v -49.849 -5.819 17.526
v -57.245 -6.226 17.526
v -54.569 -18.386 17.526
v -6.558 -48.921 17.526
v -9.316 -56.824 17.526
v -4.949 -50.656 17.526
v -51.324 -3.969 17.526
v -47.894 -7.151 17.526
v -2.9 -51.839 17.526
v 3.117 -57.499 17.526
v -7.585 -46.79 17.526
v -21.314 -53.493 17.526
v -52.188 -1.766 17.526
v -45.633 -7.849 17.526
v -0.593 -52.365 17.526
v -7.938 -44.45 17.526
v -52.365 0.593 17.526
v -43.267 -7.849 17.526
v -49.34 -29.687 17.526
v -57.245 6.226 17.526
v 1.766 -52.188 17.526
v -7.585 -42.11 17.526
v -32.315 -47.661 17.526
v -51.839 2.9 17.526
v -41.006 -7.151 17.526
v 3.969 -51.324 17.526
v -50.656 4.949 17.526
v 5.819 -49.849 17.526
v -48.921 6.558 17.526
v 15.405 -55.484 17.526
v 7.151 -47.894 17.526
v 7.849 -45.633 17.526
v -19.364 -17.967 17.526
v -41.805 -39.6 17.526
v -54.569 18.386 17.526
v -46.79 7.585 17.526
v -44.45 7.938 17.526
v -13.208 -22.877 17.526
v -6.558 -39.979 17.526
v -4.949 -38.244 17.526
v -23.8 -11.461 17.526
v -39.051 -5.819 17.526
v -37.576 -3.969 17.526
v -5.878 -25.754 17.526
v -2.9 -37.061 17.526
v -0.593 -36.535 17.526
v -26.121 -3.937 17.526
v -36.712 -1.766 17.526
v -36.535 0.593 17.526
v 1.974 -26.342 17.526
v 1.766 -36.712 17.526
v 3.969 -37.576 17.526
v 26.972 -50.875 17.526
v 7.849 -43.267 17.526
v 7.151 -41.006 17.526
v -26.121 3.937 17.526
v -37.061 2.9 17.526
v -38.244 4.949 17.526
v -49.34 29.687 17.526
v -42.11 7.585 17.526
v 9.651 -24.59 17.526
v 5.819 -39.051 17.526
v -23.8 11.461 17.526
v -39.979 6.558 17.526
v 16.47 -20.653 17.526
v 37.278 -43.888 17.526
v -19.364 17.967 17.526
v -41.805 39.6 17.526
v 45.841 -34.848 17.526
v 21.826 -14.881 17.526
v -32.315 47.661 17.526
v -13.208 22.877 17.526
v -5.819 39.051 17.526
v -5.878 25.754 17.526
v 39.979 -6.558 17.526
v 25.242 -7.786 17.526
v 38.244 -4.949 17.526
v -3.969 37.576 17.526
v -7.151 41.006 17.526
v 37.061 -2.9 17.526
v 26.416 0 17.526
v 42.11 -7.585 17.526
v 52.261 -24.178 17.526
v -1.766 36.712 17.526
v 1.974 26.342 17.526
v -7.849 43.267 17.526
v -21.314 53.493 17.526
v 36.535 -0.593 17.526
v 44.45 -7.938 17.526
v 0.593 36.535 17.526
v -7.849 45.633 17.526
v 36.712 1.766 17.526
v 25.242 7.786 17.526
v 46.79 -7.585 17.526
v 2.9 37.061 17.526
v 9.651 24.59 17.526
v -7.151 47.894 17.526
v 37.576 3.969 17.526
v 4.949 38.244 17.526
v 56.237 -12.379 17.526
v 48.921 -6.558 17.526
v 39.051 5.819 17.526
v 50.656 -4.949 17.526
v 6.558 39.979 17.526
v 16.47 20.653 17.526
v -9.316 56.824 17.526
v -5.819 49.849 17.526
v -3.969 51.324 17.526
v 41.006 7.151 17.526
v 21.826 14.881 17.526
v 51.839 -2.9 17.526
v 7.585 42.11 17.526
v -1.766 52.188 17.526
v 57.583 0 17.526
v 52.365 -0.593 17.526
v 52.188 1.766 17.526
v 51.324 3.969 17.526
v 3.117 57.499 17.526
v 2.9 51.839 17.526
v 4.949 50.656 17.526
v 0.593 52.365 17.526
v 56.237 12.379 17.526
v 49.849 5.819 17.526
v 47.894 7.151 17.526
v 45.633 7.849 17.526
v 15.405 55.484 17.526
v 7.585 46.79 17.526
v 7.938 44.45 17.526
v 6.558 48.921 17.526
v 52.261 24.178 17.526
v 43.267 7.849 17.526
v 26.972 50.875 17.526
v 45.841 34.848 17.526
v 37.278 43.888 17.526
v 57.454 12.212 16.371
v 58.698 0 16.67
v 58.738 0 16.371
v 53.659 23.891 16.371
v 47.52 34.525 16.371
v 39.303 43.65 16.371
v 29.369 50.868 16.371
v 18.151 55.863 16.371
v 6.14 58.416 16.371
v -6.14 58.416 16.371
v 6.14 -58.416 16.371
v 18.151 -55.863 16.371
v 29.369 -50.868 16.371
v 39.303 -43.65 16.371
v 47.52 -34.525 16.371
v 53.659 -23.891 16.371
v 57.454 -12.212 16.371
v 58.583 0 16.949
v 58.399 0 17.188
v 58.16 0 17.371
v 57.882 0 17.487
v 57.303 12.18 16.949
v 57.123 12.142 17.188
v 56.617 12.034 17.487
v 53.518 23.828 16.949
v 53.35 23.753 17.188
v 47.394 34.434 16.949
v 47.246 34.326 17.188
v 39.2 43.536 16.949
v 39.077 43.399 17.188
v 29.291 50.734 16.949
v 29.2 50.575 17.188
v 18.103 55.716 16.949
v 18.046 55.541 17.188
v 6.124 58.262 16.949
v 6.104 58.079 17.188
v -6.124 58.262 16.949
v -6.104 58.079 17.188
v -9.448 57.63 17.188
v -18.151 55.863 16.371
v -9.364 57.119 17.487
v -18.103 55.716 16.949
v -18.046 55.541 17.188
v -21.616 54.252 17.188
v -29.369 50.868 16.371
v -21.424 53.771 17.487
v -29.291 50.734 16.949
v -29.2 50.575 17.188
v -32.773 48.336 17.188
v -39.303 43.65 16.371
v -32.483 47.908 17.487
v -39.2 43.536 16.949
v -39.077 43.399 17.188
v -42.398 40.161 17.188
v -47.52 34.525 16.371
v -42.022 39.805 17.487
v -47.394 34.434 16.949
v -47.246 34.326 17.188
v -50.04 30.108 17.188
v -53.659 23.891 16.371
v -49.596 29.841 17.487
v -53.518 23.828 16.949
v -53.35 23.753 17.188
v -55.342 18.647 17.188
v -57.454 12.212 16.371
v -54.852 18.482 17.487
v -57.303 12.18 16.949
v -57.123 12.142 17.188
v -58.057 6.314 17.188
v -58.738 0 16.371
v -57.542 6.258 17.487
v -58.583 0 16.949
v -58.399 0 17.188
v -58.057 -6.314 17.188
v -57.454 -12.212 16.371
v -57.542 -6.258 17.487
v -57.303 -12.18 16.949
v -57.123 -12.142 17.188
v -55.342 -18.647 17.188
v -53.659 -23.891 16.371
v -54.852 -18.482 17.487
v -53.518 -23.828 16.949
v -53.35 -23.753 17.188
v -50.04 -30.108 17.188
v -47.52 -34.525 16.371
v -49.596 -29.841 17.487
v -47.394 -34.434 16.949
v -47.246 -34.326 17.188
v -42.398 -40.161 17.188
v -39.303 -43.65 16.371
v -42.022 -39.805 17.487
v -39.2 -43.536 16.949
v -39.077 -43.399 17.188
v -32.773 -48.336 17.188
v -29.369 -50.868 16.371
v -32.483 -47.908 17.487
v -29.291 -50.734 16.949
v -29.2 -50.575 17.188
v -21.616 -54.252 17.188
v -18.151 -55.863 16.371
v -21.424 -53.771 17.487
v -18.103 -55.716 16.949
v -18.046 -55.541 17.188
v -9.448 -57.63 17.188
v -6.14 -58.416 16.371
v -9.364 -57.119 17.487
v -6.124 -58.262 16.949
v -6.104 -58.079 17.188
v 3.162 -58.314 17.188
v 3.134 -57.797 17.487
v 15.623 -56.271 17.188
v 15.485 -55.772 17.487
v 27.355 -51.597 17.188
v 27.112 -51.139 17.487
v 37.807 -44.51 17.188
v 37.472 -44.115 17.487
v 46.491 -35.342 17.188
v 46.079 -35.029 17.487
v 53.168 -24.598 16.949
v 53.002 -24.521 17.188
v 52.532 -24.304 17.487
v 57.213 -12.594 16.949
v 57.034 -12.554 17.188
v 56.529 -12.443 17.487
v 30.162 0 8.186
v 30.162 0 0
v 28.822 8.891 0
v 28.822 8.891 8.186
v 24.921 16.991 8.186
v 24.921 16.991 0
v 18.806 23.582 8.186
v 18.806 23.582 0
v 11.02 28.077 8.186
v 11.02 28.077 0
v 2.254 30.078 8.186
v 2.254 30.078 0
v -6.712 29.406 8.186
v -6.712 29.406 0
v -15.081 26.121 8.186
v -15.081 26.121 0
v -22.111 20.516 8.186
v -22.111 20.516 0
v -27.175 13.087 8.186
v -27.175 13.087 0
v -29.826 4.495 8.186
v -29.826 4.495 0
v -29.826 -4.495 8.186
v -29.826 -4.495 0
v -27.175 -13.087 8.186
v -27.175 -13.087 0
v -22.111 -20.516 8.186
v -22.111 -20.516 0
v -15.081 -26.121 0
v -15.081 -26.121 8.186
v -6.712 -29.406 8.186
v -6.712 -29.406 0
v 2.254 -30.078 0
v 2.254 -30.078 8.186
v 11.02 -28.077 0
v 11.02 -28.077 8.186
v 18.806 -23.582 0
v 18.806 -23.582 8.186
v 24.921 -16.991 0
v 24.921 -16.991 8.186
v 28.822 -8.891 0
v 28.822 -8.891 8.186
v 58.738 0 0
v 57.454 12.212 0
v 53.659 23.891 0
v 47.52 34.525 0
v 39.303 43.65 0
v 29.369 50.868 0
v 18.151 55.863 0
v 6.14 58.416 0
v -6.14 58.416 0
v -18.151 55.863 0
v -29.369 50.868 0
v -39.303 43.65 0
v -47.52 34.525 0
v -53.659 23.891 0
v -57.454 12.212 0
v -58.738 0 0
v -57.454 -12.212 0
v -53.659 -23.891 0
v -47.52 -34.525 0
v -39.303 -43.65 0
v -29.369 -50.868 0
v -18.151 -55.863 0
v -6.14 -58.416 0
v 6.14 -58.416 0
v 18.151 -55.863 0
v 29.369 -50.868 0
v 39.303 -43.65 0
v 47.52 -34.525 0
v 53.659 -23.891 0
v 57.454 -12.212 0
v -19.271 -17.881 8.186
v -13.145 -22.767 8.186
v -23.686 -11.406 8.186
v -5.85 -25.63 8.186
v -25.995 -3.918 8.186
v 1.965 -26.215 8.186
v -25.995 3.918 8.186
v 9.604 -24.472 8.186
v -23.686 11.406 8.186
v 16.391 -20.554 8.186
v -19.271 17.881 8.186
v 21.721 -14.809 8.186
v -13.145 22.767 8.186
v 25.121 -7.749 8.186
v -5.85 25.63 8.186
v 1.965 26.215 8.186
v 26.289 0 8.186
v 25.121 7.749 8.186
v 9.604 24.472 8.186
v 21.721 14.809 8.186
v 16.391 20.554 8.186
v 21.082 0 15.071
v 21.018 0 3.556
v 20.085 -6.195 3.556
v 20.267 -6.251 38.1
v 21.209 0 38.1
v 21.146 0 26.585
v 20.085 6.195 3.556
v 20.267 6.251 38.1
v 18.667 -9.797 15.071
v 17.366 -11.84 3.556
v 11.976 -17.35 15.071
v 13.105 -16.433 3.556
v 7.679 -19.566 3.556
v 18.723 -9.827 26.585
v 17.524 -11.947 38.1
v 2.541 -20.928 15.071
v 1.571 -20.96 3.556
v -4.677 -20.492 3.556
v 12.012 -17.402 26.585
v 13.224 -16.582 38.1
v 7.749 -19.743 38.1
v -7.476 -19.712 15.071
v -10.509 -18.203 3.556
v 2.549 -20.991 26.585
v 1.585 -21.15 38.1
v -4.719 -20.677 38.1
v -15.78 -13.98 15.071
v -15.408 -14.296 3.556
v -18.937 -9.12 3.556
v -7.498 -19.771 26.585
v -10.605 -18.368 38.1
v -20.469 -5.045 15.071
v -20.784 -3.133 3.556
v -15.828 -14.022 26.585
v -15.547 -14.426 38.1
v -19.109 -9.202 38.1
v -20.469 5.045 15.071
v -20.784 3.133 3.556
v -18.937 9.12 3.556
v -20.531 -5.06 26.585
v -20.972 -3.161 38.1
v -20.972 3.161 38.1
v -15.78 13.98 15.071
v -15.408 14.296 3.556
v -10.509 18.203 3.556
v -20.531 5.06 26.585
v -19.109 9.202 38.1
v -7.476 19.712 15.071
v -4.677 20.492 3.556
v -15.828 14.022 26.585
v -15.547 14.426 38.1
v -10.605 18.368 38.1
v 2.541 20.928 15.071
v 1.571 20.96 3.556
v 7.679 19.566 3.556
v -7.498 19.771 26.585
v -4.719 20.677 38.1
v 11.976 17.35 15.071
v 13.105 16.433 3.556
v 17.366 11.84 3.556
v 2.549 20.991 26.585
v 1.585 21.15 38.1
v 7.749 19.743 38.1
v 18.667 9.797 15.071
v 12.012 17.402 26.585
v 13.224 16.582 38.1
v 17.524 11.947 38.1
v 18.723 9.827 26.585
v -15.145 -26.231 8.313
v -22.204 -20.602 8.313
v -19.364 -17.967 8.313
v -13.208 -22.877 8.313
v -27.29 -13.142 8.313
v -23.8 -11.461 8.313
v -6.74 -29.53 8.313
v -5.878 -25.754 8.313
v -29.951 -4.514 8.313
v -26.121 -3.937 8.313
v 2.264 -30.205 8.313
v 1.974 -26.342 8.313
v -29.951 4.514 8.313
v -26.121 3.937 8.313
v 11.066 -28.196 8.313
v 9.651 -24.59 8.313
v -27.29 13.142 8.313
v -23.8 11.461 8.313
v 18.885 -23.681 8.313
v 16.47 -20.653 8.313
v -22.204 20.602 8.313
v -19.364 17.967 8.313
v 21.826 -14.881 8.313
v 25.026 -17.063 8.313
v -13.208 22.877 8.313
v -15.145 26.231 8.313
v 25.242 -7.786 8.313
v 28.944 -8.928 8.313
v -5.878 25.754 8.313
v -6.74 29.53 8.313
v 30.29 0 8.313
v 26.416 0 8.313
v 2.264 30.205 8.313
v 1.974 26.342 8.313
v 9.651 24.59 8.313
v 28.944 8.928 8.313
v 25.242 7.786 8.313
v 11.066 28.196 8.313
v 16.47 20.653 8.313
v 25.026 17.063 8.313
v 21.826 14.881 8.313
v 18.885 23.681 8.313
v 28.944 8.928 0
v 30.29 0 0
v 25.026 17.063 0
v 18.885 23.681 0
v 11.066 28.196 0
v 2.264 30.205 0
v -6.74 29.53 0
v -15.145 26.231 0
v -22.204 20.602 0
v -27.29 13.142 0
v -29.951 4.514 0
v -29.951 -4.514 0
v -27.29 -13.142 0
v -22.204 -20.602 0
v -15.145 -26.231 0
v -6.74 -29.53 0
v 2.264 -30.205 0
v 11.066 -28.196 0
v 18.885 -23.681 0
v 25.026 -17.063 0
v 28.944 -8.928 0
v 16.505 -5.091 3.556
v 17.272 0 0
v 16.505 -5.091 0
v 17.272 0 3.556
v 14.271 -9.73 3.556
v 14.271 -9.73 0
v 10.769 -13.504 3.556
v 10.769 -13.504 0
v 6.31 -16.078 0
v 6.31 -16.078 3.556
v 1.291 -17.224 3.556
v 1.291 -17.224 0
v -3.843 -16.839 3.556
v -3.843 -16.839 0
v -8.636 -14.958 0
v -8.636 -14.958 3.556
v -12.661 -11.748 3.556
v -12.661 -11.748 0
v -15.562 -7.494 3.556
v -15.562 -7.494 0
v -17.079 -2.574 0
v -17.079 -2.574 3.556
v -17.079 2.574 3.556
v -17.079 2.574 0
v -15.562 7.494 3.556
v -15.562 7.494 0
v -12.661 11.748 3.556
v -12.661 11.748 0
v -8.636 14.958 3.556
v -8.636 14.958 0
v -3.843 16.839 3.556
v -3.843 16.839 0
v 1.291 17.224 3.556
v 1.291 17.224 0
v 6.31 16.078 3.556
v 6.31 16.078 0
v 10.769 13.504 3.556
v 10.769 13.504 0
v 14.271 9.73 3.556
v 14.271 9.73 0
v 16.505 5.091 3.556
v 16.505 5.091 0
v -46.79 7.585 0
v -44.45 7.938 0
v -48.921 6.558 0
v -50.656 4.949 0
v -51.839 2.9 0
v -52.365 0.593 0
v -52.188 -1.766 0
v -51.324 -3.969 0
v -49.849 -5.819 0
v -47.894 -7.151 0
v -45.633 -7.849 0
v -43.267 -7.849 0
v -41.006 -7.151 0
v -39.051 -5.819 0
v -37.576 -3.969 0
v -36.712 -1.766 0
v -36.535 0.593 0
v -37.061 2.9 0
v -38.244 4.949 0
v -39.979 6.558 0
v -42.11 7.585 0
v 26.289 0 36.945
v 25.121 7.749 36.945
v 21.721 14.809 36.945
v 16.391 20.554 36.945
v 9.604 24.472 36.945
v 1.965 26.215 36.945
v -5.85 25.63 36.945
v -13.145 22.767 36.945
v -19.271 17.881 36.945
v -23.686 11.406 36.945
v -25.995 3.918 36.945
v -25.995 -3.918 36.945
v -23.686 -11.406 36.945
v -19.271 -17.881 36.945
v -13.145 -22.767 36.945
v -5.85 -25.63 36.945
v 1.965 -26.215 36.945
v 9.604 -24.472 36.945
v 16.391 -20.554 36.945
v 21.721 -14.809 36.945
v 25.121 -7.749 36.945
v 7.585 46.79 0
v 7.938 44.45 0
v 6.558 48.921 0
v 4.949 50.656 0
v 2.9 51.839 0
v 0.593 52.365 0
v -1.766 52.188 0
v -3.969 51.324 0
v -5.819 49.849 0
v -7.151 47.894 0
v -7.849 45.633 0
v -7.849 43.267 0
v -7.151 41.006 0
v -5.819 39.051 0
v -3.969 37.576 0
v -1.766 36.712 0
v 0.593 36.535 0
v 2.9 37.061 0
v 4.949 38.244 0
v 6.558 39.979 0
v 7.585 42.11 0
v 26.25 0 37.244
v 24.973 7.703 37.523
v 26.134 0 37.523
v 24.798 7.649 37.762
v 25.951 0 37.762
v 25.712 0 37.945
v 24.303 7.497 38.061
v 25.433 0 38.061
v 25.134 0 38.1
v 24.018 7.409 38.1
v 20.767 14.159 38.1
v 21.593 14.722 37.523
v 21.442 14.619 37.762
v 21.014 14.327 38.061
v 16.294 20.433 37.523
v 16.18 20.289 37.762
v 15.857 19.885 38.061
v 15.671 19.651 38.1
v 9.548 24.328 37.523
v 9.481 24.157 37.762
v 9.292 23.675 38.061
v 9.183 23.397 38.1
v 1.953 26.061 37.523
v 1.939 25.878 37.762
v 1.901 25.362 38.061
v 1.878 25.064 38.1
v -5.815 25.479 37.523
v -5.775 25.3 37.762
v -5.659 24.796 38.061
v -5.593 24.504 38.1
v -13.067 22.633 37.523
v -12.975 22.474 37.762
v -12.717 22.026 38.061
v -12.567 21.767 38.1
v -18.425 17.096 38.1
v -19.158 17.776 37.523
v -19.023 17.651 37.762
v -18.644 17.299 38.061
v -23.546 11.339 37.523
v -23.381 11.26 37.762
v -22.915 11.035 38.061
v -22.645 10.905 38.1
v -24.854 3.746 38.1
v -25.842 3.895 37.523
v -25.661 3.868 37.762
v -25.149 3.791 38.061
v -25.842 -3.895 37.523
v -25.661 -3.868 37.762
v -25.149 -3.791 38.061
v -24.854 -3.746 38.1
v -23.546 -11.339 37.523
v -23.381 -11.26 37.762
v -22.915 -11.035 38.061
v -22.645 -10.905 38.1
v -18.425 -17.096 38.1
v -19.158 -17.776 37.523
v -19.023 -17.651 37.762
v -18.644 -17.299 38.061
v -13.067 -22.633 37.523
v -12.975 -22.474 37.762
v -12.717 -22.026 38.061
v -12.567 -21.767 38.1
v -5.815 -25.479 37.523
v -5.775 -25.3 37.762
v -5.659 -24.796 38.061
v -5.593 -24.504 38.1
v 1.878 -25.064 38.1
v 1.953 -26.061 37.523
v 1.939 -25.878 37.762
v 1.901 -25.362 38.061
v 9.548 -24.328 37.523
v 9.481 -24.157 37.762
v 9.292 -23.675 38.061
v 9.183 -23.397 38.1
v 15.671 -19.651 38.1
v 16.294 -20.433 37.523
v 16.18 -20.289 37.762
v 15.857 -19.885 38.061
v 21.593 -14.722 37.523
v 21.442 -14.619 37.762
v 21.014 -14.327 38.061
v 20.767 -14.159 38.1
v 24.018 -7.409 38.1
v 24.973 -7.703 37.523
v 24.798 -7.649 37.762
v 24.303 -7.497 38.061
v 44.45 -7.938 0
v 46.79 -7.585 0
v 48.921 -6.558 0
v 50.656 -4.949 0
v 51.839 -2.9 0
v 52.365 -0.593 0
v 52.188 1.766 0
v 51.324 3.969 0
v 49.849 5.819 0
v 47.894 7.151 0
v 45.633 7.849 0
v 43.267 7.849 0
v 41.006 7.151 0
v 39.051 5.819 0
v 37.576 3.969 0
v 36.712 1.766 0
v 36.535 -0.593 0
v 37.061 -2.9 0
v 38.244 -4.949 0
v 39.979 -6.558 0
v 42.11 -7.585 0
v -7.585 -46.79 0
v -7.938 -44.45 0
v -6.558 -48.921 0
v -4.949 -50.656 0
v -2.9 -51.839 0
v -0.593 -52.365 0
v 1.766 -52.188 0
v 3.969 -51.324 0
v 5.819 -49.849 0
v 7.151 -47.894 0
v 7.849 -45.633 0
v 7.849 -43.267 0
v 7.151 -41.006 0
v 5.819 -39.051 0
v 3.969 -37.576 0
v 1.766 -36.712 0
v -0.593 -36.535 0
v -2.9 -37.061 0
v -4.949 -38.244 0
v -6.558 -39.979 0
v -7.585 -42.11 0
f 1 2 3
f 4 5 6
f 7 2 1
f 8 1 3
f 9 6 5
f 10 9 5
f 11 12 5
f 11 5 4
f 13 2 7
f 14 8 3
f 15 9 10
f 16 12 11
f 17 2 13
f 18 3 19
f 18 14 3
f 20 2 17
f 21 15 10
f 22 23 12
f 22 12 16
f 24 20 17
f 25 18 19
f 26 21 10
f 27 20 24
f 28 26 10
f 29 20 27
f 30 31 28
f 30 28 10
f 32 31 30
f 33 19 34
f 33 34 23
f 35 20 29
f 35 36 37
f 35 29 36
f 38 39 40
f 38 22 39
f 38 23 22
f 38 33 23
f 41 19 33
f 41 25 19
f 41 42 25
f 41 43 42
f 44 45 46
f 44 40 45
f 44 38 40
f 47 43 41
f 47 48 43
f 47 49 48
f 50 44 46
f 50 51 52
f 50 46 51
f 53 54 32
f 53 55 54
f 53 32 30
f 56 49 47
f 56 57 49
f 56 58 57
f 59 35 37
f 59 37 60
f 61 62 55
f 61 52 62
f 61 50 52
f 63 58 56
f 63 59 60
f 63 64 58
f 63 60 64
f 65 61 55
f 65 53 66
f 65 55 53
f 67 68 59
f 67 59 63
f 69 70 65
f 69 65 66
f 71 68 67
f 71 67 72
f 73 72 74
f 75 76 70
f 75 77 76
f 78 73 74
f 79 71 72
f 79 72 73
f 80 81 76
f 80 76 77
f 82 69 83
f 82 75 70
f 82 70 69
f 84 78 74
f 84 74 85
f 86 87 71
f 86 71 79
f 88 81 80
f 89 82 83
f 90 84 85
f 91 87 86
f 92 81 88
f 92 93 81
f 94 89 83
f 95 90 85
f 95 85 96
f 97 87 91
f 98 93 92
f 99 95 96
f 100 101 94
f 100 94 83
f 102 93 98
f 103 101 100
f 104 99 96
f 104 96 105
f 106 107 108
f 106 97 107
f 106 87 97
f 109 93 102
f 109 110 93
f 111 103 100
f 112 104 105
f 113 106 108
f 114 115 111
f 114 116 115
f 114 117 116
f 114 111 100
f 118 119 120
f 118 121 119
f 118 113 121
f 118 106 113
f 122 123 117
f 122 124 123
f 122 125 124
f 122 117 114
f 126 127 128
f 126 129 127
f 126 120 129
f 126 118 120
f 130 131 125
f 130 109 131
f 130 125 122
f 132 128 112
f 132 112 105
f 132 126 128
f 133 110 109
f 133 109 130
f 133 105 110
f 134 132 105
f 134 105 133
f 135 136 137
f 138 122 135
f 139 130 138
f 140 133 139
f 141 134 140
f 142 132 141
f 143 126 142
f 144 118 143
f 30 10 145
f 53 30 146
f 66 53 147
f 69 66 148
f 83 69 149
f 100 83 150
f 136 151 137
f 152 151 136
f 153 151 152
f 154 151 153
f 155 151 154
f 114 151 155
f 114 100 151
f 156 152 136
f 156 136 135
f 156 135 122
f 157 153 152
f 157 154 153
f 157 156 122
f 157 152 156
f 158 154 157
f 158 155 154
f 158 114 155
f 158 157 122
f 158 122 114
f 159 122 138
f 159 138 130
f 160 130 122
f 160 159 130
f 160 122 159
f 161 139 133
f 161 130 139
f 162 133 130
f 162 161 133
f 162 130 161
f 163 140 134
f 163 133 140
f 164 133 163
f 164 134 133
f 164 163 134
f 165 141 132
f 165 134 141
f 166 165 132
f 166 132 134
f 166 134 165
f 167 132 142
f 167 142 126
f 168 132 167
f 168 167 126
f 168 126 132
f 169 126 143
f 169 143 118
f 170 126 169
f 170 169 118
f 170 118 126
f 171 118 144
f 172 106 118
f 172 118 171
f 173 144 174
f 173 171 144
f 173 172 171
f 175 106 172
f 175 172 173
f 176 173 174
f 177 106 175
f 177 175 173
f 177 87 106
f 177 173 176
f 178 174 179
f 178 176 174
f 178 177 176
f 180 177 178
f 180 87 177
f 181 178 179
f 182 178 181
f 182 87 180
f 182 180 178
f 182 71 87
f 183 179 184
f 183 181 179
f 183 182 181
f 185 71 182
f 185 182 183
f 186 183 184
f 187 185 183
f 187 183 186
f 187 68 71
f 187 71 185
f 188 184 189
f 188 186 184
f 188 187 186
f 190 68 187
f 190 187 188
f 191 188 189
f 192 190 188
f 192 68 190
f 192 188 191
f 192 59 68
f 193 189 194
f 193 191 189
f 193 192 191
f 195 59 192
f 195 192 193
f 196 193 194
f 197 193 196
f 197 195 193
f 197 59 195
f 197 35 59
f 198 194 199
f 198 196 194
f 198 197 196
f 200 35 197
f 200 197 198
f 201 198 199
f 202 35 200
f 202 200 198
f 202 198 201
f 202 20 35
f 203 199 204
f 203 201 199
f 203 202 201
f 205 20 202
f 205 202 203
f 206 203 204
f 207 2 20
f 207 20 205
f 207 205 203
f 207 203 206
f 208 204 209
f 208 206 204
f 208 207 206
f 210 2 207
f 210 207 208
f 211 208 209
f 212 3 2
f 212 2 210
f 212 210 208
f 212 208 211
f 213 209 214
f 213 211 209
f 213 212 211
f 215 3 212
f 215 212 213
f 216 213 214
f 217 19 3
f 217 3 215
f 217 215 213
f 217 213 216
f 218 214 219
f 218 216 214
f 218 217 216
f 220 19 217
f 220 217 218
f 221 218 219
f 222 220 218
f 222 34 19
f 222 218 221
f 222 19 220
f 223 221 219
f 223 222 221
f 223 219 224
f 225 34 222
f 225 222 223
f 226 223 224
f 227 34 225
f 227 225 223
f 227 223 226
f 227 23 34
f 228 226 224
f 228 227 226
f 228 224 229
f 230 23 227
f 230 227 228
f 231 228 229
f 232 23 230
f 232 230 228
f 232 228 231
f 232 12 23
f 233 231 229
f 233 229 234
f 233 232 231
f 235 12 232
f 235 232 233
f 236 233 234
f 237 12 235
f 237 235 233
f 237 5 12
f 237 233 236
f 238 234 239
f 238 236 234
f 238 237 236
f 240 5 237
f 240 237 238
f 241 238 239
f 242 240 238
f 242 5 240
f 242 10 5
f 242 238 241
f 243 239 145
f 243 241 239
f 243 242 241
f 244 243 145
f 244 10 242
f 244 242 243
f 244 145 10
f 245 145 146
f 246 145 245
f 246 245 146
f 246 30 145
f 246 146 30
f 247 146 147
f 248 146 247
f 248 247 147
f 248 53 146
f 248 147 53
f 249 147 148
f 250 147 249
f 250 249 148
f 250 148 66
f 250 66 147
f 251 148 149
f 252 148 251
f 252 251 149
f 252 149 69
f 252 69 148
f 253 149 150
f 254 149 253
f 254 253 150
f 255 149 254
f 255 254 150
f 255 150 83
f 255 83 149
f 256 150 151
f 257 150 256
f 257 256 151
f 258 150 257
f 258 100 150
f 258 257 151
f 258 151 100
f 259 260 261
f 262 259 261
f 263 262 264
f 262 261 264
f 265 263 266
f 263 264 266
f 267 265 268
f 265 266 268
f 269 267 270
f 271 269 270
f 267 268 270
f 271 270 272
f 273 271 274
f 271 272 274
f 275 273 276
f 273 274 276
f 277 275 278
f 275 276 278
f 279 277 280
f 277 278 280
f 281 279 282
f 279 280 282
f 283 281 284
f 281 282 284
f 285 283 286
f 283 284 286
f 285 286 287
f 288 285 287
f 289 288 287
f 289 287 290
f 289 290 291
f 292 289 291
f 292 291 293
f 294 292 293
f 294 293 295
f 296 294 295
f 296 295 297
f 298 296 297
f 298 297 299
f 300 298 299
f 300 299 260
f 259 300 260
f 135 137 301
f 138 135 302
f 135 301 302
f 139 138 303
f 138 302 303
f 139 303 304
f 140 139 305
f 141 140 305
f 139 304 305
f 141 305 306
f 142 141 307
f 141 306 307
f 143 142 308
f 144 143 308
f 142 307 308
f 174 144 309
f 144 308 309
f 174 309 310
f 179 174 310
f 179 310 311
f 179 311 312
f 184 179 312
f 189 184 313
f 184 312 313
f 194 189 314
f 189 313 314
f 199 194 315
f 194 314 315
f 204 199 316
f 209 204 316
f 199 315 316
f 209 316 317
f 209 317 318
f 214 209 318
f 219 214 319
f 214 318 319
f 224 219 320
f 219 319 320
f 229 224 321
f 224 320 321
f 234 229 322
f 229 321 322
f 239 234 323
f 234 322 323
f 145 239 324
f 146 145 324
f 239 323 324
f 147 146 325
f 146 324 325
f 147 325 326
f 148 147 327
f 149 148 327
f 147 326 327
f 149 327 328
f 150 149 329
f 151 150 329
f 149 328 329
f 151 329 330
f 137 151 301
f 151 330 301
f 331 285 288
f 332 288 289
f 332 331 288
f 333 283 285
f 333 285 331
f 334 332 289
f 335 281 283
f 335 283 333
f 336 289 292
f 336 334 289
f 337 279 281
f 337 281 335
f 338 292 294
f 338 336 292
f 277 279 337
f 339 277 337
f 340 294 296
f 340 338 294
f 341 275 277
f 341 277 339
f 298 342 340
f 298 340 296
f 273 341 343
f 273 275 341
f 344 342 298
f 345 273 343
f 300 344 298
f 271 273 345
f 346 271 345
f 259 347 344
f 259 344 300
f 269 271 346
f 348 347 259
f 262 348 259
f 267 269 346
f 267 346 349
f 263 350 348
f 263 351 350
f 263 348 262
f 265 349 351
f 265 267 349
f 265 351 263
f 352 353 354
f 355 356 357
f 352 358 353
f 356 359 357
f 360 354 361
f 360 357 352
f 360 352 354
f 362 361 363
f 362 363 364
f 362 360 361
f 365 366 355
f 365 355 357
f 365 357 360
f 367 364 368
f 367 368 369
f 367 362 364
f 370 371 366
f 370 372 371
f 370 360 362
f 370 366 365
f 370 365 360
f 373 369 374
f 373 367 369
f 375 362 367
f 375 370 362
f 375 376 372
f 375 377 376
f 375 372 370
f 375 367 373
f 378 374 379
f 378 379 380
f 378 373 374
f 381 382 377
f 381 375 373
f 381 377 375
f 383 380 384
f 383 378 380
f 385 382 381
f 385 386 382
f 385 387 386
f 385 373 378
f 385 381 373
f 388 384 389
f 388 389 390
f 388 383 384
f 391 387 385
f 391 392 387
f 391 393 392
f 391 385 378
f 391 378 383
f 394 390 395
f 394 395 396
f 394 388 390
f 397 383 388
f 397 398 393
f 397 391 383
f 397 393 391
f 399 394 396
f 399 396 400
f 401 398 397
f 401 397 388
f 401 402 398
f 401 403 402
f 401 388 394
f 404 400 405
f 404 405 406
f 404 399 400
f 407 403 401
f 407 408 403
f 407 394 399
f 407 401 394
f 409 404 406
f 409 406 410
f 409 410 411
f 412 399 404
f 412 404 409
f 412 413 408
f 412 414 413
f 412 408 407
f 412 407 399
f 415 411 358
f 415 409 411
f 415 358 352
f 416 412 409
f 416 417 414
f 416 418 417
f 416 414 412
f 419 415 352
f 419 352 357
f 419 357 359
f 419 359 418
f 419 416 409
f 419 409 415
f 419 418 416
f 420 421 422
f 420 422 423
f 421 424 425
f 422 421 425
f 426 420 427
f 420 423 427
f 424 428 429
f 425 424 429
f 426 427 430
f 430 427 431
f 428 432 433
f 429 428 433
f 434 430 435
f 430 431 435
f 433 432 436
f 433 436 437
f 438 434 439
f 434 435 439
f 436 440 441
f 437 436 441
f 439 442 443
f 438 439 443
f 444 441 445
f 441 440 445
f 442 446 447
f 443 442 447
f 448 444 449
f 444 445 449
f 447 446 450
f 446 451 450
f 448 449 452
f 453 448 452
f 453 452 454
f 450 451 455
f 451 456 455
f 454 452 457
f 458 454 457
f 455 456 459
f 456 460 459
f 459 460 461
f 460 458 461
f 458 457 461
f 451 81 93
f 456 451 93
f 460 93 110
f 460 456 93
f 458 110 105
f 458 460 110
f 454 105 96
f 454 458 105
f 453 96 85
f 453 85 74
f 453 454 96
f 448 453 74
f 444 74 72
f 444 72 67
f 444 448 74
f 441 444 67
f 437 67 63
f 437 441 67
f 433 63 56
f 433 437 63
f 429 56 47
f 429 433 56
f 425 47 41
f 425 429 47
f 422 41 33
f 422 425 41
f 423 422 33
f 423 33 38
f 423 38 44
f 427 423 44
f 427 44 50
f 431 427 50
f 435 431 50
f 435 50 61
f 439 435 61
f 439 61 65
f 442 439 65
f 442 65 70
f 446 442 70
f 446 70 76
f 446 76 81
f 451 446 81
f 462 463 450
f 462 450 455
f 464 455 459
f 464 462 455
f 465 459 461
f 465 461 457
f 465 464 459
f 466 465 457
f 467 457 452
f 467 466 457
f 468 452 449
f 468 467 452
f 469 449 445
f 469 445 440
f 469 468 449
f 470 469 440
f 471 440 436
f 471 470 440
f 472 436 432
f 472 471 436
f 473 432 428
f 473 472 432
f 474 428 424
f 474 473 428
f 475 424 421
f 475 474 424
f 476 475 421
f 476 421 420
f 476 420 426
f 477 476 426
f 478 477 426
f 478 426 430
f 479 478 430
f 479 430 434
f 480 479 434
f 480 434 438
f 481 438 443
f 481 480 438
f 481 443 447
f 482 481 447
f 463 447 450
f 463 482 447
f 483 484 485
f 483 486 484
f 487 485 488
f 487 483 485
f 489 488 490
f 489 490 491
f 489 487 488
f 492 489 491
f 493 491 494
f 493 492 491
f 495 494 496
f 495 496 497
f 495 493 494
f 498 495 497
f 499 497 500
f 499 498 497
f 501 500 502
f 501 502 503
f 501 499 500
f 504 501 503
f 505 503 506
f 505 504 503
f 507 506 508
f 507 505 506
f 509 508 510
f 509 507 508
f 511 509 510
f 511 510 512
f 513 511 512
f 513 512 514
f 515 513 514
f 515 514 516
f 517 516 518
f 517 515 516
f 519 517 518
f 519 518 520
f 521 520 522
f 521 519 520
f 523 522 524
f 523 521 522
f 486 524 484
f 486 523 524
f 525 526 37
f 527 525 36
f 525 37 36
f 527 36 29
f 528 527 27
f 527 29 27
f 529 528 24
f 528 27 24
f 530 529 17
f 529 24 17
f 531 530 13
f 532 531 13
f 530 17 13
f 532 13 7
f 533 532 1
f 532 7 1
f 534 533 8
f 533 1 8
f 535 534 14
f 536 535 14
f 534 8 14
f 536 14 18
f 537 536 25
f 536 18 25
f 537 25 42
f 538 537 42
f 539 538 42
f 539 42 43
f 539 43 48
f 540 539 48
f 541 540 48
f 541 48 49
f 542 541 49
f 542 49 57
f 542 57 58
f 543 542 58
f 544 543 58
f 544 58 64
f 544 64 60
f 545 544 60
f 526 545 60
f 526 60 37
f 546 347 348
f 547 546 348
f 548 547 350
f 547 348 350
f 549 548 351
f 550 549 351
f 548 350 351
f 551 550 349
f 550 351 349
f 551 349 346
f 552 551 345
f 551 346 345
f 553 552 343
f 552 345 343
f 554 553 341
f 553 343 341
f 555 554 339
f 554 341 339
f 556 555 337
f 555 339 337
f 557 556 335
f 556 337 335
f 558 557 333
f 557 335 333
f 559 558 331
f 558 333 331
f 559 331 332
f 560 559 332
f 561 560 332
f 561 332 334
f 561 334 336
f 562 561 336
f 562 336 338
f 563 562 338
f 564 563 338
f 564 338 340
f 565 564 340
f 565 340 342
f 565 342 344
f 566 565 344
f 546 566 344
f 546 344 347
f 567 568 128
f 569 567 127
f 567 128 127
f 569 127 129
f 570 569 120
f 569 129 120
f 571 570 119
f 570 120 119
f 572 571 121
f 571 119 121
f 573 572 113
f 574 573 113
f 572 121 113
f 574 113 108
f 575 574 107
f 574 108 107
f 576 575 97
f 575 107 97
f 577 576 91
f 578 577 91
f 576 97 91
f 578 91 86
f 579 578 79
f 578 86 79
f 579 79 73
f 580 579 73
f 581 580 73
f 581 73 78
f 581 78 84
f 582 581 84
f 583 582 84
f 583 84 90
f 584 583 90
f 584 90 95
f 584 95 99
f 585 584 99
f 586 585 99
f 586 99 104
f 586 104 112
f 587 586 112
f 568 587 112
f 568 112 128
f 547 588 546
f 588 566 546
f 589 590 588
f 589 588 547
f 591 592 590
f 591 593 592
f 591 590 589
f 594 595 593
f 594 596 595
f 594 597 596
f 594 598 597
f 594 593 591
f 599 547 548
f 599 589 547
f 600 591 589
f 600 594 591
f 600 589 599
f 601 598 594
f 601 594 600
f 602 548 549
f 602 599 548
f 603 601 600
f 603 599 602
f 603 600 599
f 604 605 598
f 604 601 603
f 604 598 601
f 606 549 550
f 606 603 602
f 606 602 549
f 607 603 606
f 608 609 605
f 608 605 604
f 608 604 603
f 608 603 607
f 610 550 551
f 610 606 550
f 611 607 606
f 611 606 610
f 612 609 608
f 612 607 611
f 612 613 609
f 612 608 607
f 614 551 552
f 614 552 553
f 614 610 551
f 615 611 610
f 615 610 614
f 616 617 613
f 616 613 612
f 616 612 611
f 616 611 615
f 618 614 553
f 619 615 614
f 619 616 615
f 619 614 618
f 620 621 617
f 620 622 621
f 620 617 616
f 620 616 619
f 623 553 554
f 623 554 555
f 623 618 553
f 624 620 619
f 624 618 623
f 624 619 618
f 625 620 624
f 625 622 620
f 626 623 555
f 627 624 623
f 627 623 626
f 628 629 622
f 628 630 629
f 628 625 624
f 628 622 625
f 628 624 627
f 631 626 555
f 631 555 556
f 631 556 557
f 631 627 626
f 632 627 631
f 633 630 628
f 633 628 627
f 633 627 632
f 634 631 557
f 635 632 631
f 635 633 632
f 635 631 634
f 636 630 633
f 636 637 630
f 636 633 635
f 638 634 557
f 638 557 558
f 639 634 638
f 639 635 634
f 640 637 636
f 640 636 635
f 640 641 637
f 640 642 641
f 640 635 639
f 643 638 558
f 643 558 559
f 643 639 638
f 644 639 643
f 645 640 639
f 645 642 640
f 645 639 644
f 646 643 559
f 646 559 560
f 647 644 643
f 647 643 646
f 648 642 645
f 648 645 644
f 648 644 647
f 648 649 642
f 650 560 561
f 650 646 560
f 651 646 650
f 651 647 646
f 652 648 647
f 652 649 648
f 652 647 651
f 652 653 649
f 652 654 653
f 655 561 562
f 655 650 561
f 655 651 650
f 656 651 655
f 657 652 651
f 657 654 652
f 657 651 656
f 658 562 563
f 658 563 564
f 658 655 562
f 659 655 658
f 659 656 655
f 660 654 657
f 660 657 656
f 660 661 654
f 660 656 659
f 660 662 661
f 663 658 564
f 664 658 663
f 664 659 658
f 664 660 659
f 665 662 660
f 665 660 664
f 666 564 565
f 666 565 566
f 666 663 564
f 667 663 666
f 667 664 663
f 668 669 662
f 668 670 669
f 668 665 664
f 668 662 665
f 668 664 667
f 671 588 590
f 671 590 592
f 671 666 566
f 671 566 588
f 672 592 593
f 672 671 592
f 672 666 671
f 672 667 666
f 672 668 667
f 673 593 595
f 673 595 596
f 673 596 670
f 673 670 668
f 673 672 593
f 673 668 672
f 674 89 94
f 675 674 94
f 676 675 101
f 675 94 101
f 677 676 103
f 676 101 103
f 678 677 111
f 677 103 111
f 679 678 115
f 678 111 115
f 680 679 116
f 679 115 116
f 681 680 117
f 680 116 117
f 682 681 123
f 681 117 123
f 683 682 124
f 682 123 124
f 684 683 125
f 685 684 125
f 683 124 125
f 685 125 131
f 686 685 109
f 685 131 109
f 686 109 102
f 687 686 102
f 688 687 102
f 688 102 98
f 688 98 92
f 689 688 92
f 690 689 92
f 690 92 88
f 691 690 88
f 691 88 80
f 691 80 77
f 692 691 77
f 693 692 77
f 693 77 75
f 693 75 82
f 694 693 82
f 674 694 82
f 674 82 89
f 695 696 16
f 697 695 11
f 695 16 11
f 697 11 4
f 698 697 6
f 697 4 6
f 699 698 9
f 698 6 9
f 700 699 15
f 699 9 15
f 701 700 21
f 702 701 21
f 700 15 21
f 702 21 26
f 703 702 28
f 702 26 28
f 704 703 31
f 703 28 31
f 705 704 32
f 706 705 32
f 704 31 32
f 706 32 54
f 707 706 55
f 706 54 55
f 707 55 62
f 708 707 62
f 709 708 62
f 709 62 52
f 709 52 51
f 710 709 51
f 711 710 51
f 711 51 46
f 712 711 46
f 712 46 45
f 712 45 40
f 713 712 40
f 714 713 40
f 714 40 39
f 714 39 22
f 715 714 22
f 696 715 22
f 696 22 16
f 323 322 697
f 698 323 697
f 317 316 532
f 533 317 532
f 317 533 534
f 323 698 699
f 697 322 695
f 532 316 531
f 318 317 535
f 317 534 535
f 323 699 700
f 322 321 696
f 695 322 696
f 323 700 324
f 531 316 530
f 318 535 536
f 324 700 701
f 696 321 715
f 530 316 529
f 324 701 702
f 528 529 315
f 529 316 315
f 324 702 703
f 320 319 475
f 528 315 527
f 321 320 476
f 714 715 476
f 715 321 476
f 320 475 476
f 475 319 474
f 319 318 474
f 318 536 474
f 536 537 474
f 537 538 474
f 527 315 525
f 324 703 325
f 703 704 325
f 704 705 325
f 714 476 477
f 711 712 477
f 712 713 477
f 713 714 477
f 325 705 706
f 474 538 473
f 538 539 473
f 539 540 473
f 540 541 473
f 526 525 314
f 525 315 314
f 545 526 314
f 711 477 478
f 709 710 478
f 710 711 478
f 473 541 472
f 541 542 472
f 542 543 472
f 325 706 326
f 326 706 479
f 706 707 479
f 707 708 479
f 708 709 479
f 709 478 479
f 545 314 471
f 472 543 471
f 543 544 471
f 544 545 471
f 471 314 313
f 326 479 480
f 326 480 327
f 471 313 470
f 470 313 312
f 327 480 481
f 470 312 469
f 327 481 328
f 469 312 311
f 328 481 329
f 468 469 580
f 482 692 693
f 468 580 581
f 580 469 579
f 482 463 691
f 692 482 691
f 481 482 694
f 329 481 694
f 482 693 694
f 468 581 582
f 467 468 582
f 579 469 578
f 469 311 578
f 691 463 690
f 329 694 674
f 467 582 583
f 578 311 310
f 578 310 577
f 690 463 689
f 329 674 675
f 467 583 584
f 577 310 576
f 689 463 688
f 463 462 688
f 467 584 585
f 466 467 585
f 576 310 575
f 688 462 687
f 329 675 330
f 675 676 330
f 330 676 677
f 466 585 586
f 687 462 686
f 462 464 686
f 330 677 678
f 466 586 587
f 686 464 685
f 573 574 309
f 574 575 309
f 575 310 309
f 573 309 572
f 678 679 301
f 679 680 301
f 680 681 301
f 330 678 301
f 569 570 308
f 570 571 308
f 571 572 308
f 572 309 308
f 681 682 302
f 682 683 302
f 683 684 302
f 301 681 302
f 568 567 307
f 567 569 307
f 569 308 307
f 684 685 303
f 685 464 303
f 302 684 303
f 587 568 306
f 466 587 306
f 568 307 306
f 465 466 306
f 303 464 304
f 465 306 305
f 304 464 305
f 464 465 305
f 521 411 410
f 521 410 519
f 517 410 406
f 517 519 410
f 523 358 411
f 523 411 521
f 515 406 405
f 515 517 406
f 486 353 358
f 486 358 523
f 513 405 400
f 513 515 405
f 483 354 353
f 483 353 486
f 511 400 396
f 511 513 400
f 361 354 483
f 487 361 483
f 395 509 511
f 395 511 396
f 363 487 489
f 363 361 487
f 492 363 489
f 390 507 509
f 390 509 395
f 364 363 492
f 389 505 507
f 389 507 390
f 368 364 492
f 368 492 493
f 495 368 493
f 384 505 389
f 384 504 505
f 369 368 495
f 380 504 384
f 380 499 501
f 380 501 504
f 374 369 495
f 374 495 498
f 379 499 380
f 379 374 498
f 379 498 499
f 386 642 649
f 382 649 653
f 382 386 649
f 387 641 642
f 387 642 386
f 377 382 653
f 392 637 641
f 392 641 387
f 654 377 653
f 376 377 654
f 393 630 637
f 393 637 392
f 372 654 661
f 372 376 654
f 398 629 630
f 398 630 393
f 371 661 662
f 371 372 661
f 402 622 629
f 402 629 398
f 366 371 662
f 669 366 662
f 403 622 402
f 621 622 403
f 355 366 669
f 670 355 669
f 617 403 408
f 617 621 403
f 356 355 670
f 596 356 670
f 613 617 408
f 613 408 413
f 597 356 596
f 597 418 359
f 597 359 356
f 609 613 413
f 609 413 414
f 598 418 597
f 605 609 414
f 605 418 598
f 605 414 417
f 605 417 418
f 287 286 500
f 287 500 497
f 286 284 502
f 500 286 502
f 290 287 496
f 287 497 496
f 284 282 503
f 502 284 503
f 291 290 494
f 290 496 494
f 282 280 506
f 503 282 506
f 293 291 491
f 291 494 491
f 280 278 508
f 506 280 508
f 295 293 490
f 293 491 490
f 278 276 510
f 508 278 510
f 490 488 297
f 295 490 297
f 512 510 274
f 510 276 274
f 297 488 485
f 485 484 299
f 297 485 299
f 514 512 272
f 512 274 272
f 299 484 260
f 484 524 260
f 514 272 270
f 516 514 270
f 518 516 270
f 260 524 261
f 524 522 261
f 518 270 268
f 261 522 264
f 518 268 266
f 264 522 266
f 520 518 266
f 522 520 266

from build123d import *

# Parameters (mm, degrees)
SKETCH1_R                       = 58.7375
EXTRUDE1_DEPTH                  = 17.526
SKETCH2_R                       = 26.289
EXTRUDE2_DEPTH                  = 20.574
SKETCH3_R                       = 7.9375
EXTRUDE3_DEPTH                  = 86.577317605
CIRPATTERN1_COUNT               = 4
FILLET1_R                       = 1.154545455
CUT_REVOLVE_THIN1_OUTLINE_R     = 30.2895
CUT_REVOLVE_THIN1_OUTLINE_R_2   = 30.1625
CUT_REVOLVE_THIN1_DEPTH         = 8.312727273
CUT_REVOLVE_THIN1_START         = 8.185727273
CUT_REVOLVE_THIN1_2_OUTLINE_R   = 26.416
CUT_REVOLVE_THIN1_2_OUTLINE_R_2 = 26.289
CUT_REVOLVE_THIN1_2_DEPTH       = 9.340272727
CUT_REVOLVE_THIN1_3_OUTLINE_R   = 30.1625
CUT_REVOLVE_THIN1_3_OUTLINE_R_2 = 26.416
CUT_REVOLVE_THIN1_3_DEPTH       = 0.127


# Read off the part's stored shape, not the designer's step: Cut-Revolve-Thin1
with BuildPart() as part:
    # Sketch1 → Extrude1 (new body)
    with BuildSketch(Plane.XY):
        Circle(SKETCH1_R)
    extrude(amount=EXTRUDE1_DEPTH)

    # Sketch2 → Extrude2 (add)
    with BuildSketch(Plane.XY.offset(17.526)):
        Circle(SKETCH2_R)
    extrude(amount=EXTRUDE2_DEPTH)

    # Sketch3 → Extrude3 (cut, through all)
    with BuildSketch(Plane.XY.offset(17.526)):
        with Locations((0, 44.45)):
            Circle(SKETCH3_R)
    extrude3 = extrude(amount=-EXTRUDE3_DEPTH, mode=Mode.SUBTRACT)

    # CirPattern1: Extrude3 ×4 about axis
    cirpattern1_axis = Axis((0, 0, 0), (0, 0, 1))
    for i in range(1, CIRPATTERN1_COUNT):
        add(extrude3.rotate(cirpattern1_axis, i * 360 / CIRPATTERN1_COUNT), mode=Mode.SUBTRACT)

    # Fillet1
    fillet1_edges = [part.edges().sort_by_distance(p)[0] for p in [
        (-58.7375, 0, 17.526),
        (-26.289, 0, 38.1),
    ]]
    fillet(fillet1_edges, radius=FILLET1_R)

    # Sketch4 → Cut-Revolve1 (revolve, cut)
    with BuildSketch(Plane(origin=(0, 0, 62.70625), x_dir=(0, 0, 1), z_dir=(-1, 0, 0)), mode=Mode.PRIVATE) as cut_revolve1_sk:
        Polygon((-62.70625, 17.272), (-59.15025, 17.272), (-59.15025, 21.0185), (-24.60625, 21.209), (-24.60625, 0), (-62.70625, 0), align=None)
    revolve(cut_revolve1_sk.sketch.rotate(Axis((0, 0, 38.1), (0, 0, -1)), 90), axis=Axis((0, 0, 38.1), (0, 0, -1)), mode=Mode.SUBTRACT)

    # Cut-Revolve-Thin1 outline → Cut-Revolve-Thin1 (cut)
    with BuildSketch(Plane.XY):
        Circle(CUT_REVOLVE_THIN1_OUTLINE_R)
        Circle(CUT_REVOLVE_THIN1_OUTLINE_R_2, mode=Mode.SUBTRACT)
    extrude(amount=CUT_REVOLVE_THIN1_DEPTH, mode=Mode.SUBTRACT)

    # Cut-Revolve-Thin1 2 outline → Cut-Revolve-Thin1 2 (cut)
    with BuildSketch(Plane.XY.offset(CUT_REVOLVE_THIN1_START)):
        Circle(CUT_REVOLVE_THIN1_2_OUTLINE_R)
        Circle(CUT_REVOLVE_THIN1_2_OUTLINE_R_2, mode=Mode.SUBTRACT)
    extrude(amount=CUT_REVOLVE_THIN1_2_DEPTH, mode=Mode.SUBTRACT)

    # Cut-Revolve-Thin1 3 outline → Cut-Revolve-Thin1 3 (cut)
    with BuildSketch(Plane.XY.offset(CUT_REVOLVE_THIN1_START)):
        Circle(CUT_REVOLVE_THIN1_3_OUTLINE_R)
        Circle(CUT_REVOLVE_THIN1_3_OUTLINE_R_2, mode=Mode.SUBTRACT)
    extrude(amount=CUT_REVOLVE_THIN1_3_DEPTH, mode=Mode.SUBTRACT)


solid = part.part
